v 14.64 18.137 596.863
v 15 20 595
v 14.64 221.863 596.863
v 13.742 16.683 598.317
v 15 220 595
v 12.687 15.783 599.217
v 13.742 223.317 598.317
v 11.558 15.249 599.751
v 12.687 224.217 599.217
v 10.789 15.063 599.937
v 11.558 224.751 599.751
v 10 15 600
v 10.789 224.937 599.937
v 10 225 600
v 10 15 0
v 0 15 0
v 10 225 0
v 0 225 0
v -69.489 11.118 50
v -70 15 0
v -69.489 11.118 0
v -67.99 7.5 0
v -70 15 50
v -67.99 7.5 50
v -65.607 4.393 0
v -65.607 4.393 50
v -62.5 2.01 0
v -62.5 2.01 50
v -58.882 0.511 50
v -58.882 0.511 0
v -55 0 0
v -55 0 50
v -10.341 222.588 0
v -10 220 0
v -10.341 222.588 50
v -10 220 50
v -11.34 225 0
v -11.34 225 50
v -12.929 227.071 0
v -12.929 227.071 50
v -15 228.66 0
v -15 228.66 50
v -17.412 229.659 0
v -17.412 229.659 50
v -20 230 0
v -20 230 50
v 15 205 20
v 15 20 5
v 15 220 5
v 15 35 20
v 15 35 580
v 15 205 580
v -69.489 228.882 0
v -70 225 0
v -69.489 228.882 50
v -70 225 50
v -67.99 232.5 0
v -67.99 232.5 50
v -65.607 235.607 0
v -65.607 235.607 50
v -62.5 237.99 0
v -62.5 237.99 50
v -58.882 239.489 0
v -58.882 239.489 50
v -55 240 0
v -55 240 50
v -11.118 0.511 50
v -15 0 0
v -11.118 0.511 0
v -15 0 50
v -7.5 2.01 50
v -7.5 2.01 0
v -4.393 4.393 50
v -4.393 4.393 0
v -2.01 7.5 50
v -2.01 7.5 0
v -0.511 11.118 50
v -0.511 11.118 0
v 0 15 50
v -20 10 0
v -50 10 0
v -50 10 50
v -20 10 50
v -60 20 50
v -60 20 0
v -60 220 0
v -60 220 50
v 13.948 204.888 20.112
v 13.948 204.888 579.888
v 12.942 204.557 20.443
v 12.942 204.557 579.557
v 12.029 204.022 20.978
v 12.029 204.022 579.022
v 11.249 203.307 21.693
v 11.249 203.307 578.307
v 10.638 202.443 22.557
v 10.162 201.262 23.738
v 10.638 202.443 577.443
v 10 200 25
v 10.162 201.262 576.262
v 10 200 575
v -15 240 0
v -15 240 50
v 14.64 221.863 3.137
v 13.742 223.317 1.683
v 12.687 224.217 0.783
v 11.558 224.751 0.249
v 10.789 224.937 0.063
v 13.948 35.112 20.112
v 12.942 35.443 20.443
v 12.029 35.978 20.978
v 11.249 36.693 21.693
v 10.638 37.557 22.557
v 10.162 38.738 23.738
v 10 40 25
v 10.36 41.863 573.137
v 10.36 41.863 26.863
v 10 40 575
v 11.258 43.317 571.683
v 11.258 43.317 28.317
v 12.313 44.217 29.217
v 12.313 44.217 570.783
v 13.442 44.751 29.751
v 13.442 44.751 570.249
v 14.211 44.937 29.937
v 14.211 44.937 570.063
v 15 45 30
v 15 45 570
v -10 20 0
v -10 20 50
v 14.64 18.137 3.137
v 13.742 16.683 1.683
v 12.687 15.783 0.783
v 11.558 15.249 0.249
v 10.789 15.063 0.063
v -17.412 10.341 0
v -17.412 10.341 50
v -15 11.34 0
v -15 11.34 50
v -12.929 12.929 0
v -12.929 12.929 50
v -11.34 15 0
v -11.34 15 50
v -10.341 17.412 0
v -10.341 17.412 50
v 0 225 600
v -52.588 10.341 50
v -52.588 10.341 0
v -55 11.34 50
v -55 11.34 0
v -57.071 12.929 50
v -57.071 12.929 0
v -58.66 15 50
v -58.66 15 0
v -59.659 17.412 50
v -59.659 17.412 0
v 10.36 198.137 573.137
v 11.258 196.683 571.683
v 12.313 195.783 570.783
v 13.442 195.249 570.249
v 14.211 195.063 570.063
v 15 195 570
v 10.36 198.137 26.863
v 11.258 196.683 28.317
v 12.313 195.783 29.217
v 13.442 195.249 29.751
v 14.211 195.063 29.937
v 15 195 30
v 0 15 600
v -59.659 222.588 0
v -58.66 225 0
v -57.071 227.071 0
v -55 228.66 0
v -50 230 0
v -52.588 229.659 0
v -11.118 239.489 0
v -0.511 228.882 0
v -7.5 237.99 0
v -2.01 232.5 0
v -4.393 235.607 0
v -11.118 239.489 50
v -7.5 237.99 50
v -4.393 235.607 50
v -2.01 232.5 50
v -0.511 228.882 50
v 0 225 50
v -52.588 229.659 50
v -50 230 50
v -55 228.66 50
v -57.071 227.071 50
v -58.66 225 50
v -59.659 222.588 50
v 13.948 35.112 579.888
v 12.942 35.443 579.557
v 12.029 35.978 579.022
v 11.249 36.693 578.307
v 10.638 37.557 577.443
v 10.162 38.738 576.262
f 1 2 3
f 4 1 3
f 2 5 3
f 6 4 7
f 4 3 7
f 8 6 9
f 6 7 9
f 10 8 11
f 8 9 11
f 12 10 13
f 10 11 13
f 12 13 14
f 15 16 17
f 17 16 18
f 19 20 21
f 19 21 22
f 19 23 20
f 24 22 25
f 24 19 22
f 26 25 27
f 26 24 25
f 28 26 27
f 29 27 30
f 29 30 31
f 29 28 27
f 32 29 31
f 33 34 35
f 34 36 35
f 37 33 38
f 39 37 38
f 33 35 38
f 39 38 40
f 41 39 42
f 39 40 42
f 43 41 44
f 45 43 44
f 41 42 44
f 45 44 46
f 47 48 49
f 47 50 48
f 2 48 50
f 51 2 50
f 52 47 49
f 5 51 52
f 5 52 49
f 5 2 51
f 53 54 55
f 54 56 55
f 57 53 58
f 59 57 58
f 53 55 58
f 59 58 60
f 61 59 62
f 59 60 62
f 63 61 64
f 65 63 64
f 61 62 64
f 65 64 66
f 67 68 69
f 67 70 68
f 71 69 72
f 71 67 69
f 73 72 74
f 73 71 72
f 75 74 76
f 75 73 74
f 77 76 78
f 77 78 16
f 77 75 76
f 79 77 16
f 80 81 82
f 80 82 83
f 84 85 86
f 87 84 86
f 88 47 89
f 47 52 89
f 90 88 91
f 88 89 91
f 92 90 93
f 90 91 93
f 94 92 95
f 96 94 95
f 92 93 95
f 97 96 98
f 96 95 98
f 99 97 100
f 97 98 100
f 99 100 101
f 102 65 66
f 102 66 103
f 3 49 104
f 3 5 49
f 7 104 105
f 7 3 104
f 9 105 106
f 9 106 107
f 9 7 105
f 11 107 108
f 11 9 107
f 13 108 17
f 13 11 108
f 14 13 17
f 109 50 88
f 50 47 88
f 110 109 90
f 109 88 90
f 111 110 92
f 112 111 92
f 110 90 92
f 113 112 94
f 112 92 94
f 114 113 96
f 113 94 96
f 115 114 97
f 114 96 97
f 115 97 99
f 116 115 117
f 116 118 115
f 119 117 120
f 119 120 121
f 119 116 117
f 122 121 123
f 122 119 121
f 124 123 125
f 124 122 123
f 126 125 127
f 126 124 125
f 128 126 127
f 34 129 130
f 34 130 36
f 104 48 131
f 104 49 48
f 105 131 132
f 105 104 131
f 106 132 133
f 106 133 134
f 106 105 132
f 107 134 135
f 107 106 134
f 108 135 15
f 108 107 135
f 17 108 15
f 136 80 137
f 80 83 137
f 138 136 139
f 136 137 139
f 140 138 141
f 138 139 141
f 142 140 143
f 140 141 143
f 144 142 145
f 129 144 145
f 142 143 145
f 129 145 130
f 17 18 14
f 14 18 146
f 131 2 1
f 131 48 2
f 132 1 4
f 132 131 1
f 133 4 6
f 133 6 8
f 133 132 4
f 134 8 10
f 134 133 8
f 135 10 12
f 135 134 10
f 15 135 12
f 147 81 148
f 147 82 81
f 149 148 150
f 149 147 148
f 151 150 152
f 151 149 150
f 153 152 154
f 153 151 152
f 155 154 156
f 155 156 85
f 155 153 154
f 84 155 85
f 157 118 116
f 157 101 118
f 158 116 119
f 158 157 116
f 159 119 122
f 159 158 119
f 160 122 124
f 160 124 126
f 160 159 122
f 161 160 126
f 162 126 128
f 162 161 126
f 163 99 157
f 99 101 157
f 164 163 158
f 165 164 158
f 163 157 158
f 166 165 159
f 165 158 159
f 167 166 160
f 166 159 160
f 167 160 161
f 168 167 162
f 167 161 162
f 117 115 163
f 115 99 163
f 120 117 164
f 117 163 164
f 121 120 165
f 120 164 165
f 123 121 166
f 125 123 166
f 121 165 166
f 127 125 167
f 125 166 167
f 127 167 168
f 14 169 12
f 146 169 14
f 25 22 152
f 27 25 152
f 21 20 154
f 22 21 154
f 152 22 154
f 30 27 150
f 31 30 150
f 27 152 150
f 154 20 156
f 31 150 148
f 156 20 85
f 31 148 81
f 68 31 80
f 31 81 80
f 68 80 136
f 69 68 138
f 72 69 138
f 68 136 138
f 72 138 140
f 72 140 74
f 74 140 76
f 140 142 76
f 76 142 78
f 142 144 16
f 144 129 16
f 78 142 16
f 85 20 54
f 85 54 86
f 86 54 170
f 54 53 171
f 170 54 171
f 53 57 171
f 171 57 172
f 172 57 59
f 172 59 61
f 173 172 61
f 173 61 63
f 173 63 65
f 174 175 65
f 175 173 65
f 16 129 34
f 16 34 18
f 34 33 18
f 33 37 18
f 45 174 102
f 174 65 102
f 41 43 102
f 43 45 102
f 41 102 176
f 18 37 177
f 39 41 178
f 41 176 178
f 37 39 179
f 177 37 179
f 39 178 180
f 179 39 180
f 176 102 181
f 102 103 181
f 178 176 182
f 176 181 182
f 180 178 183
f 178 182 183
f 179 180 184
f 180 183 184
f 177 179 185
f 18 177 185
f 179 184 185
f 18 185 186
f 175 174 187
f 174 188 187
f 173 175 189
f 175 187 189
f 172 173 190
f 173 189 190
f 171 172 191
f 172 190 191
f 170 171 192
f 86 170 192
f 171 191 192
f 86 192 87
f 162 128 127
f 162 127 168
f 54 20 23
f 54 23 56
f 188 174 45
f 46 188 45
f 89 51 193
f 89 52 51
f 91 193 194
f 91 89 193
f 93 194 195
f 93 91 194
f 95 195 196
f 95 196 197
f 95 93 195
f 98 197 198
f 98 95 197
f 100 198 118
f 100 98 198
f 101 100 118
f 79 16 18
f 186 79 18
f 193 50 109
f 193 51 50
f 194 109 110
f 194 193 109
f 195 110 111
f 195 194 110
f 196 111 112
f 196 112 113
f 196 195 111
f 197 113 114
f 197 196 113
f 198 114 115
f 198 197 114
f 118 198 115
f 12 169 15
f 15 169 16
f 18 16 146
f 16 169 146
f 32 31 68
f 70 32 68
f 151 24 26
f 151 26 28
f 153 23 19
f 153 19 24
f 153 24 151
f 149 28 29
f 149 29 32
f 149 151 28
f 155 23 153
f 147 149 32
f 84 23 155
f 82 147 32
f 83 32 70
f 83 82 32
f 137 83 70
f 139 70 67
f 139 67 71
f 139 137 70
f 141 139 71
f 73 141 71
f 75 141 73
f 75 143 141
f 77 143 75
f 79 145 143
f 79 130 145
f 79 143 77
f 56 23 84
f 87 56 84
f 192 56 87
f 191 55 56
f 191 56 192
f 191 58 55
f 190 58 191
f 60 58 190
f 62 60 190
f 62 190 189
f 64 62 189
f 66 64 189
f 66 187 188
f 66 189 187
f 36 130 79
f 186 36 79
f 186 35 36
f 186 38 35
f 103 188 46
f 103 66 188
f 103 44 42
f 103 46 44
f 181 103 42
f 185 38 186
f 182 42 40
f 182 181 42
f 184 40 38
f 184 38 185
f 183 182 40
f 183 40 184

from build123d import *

# Parameters (mm, degrees)
F0_W     = 70
F0_H     = 240
F0_W_2   = 50
F0_H_2   = 220
F1_DEPTH = 50
F2_R     = 15
F3_R     = 10
F4_W     = 210
F4_H     = 50
F4_H_2   = 550
F5_DEPTH = 15
F6_W     = 170
F6_H     = 560
F6_W_2   = 150
F6_H_2   = 540
F7_DEPTH = 5
F8_R     = 4.99999
F9_R     = 5


# Not quite as in the source:
# - a fillet or chamfer is up to 0.001 mm smaller than in the source, because OpenCascade refuses the exact size


with BuildPart() as f1:
    # F0 (on Top) → F1 (new body)
    with BuildSketch(Plane.XY):
        with Locations((-35, 120)):
            Rectangle(F0_W, F0_H)
        with Locations((-35, 120)):
            Rectangle(F0_W_2, F0_H_2, mode=Mode.SUBTRACT)
    extrude(amount=F1_DEPTH)

    # F2
    f2_edges = [f1.edges().sort_by_distance(p)[0] for p in [
        (-70, 0, 25),
        (0, 0, 25),
        (-70, 240, 25),
        (0, 240, 25),
    ]]
    fillet(f2_edges, radius=F2_R)

    # F3
    f3_edges = [f1.edges().sort_by_distance(p)[0] for p in [
        (-10, 10, 25),
        (-60, 10, 25),
        (-10, 230, 25),
        (-60, 230, 25),
    ]]
    fillet(f3_edges, radius=F3_R)


with BuildPart() as f5:
    # F4 (on face) → F5 (new body)
    with BuildSketch(Plane.YZ):
        with Locations((120, 25)):
            Rectangle(F4_W, F4_H)
        with Locations((120, 325)):
            Rectangle(F4_W, F4_H_2)
    extrude(amount=F5_DEPTH)

    # F6 (on face) → F7 (cut)
    with BuildSketch(Plane.YZ.offset(15)):
        with Locations((120, 300)):
            Rectangle(F6_W, F6_H)
        with Locations((120, 300)):
            Rectangle(F6_W_2, F6_H_2, mode=Mode.SUBTRACT)
    extrude(amount=-F7_DEPTH, mode=Mode.SUBTRACT)

    # F8 (radius 5 in the source; OpenCascade refuses exactly that, so slightly less here)
    f8_edges = [f5.edges().sort_by_distance(p)[0] for p in [
        (10, 120, 20),
        (10, 120, 30),
        (10, 35, 300),
        (10, 120, 580),
        (10, 195, 300),
        (10, 45, 300),
        (10, 120, 570),
        (10, 205, 300),
    ]]
    fillet(f8_edges, radius=F8_R)

    # F9
    f9_edges = [f5.edges().sort_by_distance(p)[0] for p in [
        (15, 120, 0),
        (15, 225, 300),
        (15, 15, 300),
        (15, 120, 600),
    ]]
    fillet(f9_edges, radius=F9_R)


solid = Compound([f1.part, f5.part])
